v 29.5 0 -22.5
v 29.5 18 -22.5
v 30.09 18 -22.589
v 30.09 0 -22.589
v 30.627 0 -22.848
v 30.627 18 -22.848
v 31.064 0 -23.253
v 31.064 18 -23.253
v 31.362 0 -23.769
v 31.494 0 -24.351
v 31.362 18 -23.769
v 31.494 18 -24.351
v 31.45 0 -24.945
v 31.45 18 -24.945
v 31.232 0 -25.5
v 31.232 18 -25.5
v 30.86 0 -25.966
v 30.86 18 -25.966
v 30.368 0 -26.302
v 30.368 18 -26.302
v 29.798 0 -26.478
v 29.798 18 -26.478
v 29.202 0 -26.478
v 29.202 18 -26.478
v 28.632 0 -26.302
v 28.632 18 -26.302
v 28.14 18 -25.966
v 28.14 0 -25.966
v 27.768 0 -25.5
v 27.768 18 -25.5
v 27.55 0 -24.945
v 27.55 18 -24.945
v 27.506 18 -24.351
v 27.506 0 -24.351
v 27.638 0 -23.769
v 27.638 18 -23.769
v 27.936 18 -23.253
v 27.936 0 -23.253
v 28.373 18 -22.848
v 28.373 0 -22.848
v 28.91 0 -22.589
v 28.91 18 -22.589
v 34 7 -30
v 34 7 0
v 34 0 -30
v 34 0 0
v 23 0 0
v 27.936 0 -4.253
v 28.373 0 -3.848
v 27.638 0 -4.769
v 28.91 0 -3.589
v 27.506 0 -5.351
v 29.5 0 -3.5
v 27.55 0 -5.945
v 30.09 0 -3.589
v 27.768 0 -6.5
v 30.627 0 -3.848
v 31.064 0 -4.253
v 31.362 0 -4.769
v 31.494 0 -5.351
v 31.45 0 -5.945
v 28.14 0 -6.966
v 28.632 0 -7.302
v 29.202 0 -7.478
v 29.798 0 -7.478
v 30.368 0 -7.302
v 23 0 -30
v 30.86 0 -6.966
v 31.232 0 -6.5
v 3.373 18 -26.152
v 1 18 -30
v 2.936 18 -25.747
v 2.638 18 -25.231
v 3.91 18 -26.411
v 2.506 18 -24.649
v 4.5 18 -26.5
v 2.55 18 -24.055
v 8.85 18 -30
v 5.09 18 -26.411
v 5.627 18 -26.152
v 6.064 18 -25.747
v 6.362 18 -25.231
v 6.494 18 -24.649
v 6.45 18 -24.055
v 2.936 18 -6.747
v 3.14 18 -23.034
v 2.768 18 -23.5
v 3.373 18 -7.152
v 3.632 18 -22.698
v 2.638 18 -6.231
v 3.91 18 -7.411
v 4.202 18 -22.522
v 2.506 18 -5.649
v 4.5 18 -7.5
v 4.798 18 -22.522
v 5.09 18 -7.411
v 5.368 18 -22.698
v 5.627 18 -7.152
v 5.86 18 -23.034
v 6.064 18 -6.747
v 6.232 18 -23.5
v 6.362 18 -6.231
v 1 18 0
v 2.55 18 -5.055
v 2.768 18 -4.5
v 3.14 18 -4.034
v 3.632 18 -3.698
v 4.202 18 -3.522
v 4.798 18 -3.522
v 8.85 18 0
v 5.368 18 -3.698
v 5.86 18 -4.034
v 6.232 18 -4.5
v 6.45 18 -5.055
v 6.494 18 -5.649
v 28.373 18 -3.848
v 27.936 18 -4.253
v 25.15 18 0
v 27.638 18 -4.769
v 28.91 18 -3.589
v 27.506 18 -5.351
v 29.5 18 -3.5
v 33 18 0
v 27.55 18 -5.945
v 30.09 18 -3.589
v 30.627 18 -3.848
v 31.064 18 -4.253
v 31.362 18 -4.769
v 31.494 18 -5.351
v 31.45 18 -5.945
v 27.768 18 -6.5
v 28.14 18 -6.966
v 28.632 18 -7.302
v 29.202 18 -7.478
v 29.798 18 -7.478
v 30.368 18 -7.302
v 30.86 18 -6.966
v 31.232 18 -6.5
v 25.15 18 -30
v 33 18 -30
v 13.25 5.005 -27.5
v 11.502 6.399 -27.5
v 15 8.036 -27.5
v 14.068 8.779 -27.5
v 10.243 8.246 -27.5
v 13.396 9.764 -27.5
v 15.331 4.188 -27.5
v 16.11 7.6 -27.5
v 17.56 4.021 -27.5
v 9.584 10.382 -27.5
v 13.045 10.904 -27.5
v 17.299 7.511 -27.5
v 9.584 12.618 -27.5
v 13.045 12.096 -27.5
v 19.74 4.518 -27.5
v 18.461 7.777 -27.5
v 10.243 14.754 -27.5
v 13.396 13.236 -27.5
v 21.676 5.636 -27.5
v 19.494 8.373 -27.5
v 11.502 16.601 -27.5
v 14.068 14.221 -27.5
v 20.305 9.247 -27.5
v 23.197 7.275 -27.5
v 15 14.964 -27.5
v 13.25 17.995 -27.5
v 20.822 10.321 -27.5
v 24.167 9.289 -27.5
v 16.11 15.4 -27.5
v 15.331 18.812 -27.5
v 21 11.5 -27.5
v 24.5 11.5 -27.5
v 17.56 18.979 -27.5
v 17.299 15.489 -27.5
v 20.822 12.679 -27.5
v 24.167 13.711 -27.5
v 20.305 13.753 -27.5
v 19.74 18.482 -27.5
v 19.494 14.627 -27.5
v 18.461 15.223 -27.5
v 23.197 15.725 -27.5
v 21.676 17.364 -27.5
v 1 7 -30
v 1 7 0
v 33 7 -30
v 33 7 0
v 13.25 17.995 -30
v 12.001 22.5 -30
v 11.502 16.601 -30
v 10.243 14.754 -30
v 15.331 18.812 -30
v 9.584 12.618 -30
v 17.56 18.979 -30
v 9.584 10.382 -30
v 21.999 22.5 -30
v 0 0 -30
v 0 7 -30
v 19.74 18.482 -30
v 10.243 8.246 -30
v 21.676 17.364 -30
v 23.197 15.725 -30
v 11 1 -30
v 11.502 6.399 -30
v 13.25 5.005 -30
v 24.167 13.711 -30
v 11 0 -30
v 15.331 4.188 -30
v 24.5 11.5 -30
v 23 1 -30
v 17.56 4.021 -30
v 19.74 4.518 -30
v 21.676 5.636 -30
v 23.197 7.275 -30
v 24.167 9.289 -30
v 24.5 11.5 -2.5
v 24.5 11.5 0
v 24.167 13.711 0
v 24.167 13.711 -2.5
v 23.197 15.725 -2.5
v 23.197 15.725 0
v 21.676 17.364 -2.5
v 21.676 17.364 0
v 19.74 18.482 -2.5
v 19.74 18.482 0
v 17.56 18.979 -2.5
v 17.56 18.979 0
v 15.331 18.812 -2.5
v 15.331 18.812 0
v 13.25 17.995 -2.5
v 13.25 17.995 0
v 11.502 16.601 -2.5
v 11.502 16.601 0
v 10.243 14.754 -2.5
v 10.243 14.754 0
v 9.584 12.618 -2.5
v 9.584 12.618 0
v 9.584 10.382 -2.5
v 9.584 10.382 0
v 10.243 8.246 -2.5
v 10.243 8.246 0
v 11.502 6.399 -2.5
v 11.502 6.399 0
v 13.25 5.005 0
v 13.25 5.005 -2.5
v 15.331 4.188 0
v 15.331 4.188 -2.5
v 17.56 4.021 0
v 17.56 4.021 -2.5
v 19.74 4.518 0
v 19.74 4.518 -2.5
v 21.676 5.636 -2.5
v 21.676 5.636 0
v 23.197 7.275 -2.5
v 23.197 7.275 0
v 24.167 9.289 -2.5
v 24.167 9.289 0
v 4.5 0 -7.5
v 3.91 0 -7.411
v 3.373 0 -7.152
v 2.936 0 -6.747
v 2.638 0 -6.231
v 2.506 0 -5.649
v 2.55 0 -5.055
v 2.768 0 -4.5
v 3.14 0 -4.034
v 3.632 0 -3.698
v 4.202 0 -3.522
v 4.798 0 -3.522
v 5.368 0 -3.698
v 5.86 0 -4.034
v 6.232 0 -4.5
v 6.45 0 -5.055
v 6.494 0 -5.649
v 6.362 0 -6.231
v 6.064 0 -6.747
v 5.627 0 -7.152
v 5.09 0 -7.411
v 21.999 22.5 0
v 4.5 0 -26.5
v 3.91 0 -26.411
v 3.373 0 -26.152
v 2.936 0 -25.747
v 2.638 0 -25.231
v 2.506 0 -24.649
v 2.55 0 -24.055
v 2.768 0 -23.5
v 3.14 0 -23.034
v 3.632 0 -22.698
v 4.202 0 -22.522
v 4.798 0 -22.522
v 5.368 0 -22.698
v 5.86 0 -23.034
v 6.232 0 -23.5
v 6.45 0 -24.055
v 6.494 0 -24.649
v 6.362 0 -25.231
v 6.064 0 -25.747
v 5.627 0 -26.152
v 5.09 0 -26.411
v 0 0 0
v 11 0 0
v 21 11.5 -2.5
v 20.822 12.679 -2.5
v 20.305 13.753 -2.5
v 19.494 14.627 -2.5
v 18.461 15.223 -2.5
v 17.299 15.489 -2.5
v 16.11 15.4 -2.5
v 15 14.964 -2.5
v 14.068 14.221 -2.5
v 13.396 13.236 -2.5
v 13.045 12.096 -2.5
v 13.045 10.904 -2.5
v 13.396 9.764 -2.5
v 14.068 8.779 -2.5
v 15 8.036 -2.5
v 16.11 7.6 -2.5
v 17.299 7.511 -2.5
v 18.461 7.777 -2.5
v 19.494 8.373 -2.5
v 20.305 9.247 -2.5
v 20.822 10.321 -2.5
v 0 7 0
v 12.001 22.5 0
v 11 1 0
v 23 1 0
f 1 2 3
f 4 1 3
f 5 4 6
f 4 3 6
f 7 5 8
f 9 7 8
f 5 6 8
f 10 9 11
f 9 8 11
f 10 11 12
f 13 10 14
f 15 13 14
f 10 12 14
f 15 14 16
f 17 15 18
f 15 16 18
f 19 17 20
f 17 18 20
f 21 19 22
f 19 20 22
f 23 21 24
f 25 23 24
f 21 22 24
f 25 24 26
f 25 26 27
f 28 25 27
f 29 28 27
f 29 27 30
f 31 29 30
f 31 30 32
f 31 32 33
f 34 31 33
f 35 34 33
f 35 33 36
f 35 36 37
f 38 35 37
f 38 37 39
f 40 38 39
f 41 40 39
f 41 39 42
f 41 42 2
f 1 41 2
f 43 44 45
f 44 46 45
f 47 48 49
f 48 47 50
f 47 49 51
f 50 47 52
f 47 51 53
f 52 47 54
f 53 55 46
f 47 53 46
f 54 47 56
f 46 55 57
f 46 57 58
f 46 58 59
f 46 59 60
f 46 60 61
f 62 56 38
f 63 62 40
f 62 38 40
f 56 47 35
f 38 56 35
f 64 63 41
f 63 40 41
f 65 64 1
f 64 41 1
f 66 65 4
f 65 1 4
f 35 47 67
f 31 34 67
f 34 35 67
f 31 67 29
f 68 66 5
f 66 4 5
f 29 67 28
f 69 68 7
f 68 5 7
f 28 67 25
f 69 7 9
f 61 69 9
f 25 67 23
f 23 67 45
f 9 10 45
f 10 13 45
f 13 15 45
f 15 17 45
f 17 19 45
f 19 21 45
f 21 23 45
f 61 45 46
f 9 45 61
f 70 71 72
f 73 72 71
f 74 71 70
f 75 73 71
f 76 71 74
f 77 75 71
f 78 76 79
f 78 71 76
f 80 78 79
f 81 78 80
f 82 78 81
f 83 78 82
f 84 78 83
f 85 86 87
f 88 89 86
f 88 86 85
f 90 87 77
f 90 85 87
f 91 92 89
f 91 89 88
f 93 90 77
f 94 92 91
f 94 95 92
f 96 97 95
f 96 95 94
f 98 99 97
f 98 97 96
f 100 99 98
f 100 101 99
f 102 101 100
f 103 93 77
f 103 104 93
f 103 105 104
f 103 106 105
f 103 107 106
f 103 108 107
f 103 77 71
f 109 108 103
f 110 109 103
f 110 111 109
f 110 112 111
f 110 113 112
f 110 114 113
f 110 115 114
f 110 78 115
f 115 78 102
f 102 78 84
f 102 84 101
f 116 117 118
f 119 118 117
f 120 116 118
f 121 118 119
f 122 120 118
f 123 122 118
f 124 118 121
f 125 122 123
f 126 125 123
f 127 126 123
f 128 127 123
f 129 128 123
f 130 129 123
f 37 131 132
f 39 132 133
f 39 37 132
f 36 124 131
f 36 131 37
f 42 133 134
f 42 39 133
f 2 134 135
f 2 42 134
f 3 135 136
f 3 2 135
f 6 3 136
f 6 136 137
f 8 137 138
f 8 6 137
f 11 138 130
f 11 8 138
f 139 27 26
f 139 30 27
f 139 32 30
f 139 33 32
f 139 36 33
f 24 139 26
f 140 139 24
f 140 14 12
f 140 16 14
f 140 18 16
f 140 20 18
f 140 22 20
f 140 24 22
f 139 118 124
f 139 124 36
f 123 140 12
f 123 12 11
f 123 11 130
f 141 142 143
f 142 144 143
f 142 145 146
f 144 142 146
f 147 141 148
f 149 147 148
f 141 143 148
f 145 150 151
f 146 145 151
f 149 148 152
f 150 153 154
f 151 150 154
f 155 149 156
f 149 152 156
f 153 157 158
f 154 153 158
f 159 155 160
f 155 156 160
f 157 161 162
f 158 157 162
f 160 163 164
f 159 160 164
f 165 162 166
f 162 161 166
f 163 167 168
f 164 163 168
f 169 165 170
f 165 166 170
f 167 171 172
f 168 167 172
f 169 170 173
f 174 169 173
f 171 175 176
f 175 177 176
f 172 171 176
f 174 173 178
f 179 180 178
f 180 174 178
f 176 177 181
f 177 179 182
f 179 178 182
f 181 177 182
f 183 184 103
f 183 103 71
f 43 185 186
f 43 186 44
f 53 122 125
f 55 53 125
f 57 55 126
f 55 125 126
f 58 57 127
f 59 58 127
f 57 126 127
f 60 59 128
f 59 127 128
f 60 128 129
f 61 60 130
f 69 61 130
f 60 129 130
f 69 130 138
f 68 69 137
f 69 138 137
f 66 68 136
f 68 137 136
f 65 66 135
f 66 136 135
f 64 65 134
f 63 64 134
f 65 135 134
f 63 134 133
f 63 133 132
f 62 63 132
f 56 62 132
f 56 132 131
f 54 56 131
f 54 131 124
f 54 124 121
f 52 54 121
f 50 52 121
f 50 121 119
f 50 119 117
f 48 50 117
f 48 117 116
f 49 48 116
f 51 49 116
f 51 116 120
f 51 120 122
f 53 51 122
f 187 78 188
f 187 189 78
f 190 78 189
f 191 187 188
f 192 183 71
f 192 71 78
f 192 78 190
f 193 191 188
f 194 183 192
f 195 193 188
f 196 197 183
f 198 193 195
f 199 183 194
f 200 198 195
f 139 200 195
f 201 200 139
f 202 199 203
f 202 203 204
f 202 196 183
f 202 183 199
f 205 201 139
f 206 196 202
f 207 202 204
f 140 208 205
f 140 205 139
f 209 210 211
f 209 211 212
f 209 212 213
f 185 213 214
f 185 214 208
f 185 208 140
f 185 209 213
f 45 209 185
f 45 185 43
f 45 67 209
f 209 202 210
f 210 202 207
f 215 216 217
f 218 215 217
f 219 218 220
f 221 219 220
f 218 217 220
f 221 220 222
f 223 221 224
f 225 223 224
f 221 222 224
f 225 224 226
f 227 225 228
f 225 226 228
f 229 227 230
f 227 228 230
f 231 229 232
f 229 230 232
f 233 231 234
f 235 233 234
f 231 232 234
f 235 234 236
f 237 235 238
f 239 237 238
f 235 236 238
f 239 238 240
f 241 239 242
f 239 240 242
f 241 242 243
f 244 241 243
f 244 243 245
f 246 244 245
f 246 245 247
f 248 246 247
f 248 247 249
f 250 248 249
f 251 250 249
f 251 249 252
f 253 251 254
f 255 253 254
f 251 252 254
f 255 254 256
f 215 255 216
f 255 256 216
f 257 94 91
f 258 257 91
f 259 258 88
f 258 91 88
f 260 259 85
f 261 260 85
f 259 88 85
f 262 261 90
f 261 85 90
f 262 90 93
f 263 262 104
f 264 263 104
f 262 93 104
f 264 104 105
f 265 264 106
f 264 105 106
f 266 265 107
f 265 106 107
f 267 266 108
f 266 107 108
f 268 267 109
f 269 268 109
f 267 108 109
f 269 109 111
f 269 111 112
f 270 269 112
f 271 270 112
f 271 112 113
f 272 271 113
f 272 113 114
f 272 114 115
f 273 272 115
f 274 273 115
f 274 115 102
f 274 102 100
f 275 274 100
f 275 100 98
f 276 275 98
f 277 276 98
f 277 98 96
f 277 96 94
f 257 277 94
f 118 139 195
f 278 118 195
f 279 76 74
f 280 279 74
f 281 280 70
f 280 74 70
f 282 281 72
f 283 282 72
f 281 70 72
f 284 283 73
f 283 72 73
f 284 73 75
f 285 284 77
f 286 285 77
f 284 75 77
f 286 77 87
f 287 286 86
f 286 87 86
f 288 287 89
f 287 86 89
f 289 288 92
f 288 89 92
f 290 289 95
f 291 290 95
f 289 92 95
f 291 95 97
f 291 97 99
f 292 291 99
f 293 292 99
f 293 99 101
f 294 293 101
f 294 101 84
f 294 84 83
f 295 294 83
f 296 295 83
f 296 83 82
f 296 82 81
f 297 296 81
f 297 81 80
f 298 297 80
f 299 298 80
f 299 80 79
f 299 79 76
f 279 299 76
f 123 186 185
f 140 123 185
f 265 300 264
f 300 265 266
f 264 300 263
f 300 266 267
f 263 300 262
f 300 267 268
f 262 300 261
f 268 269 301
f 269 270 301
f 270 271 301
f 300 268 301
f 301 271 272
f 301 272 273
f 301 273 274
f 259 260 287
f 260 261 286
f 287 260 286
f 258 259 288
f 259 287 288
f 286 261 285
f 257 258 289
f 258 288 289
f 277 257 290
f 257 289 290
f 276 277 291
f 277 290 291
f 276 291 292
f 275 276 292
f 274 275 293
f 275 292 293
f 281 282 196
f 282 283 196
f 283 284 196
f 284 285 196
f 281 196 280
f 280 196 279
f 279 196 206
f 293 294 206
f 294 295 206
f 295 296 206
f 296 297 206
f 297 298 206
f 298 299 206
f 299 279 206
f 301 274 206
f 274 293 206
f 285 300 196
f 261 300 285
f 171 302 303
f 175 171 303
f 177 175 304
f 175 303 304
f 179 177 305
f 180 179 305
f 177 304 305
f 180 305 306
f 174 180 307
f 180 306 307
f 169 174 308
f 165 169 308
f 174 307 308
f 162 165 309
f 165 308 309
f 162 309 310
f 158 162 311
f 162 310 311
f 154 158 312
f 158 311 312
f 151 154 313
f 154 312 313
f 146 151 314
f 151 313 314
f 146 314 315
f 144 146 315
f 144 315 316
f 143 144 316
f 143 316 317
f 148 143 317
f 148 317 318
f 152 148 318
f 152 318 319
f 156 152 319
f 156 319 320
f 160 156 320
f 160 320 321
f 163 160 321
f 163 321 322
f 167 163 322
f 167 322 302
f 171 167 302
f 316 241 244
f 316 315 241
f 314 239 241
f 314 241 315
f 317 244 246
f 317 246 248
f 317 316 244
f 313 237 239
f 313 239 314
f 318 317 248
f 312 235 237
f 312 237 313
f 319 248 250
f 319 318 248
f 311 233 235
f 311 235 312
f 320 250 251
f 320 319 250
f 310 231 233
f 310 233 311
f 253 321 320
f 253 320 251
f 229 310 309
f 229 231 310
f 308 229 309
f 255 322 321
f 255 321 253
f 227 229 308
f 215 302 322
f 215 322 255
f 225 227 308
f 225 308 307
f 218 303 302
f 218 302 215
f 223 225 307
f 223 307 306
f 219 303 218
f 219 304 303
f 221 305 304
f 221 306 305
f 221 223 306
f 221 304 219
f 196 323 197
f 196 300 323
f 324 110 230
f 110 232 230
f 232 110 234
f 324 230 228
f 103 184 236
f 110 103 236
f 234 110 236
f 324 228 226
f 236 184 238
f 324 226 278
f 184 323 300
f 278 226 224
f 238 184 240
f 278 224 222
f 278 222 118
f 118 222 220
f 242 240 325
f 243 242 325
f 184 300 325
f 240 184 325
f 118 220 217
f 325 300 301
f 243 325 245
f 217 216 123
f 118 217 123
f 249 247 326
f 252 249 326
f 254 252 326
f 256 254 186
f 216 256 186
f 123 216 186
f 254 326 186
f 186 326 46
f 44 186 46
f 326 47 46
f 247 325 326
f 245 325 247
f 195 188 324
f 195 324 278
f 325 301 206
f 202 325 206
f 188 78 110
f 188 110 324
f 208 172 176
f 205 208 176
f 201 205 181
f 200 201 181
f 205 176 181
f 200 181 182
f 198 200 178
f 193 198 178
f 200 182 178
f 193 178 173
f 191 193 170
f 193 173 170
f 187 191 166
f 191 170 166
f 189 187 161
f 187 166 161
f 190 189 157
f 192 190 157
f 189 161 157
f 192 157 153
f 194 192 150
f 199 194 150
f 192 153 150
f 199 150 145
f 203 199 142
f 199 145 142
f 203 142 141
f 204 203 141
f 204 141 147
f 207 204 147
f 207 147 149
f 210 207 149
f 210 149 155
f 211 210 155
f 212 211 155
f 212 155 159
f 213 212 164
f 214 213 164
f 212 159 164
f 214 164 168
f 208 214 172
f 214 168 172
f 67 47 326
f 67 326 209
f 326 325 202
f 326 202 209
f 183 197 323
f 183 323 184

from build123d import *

# Parameters (mm, degrees)
SKETCH1_W           = 10
SKETCH1_H           = 30
SKETCH1_W_2         = 1
BOSS_EXTRUDE1_DEPTH = 1
BOSS_EXTRUDE4_START = 1
SKETCH1_3_W         = 34
SKETCH1_3_H         = 30
BOSS_EXTRUDE4_DEPTH = 6
BOSS_EXTRUDE5_START = 7
SKETCH1_4_W         = 10
SKETCH1_4_H         = 30
SKETCH1_4_W_2       = 12
BOSS_EXTRUDE5_DEPTH = 11
SKETCH3_W           = 8.5
SKETCH3_H           = 30
BOSS_EXTRUDE6_DEPTH = 4.5
CHAMFER1_SIZE       = 5
CHAMFER1_SIZE_2     = 3.501037691
SKETCH5_R           = 7.5
SKETCH5_R_2         = 4
CUT_EXTRUDE1_DEPTH  = 2.5
SKETCH5_3_R         = 4
CUT_EXTRUDE2_DEPTH  = 51.618672444
CUT_EXTRUDE4_START  = -27.5
SKETCH5_4_R         = 7.5
SKETCH5_4_R_2       = 4
CUT_EXTRUDE4_DEPTH  = 2.5
SKETCH6_R           = 2
CUT_EXTRUDE5_DEPTH  = 49.785243671


with BuildPart() as part:
    # Sketch1 → Boss-Extrude1 (new body)
    with BuildSketch(Plane(origin=(0, 0, 0), x_dir=(1, 0, 0), z_dir=(0, 1, 0))):
        with Locations((28, 15)):
            Rectangle(SKETCH1_W, SKETCH1_H)
        with Locations((33.5, 15)):
            Rectangle(SKETCH1_W_2, SKETCH1_H)
        with Locations((0.5, 15)):
            Rectangle(SKETCH1_W_2, SKETCH1_H)
        with Locations((6, 15)):
            Rectangle(SKETCH1_W, SKETCH1_H)
    extrude(amount=BOSS_EXTRUDE1_DEPTH)

    # Sketch1<3> → Boss-Extrude4 (add)
    with BuildSketch(Plane(origin=(0, 0, 0), x_dir=(1, 0, 0), z_dir=(0, 1, 0)).offset(BOSS_EXTRUDE4_START)):
        with Locations((17, 15)):
            Rectangle(SKETCH1_3_W, SKETCH1_3_H)
    extrude(amount=BOSS_EXTRUDE4_DEPTH)

    # Sketch1<4> → Boss-Extrude5 (add)
    with BuildSketch(Plane(origin=(0, 0, 0), x_dir=(1, 0, 0), z_dir=(0, 1, 0)).offset(BOSS_EXTRUDE5_START)):
        with Locations((6, 15)):
            Rectangle(SKETCH1_4_W, SKETCH1_4_H)
        with Locations((28, 15)):
            Rectangle(SKETCH1_4_W, SKETCH1_4_H)
        with Locations((17, 15)):
            Rectangle(SKETCH1_4_W_2, SKETCH1_4_H)
    extrude(amount=BOSS_EXTRUDE5_DEPTH)

    # Sketch3 → Boss-Extrude6 (add)
    with BuildSketch(Plane(origin=(0, 18, 0), x_dir=(1, 0, 0), z_dir=(0, 1, 0))):
        with Locations((21.25, 15)):
            Rectangle(SKETCH3_W, SKETCH3_H)
        with Locations((12.75, 15)):
            Rectangle(SKETCH3_W, SKETCH3_H)
    extrude(amount=BOSS_EXTRUDE6_DEPTH)

    # Chamfer1
    # the kernel refuses this chamfer: 5, 3.501037691 mm, written as the material it takes off along each edge
    with BuildSketch(Plane(origin=(25.5, 22.5, 12.912761151), x_dir=(0, -1, 0), z_dir=(0, 0, -1))) as chamfer1_piece_1_section:
        Polygon((CHAMFER1_SIZE, 0), (0, CHAMFER1_SIZE_2), (0, 0), align=None)
    chamfer1_piece_1 = extrude(amount=55.825522303, mode=Mode.PRIVATE)
    chamfer1_piece_1 = split(chamfer1_piece_1, bisect_by=Plane(origin=(25.5, 18, 12.912761151), z_dir=(0, 1, 0)), keep=Keep.TOP, mode=Mode.PRIVATE)
    add(chamfer1_piece_1, mode=Mode.SUBTRACT)
    with BuildSketch(Plane(origin=(8.5, 22.5, -42.912761151), x_dir=(0, -1, 0), z_dir=(0, 0, 1))) as chamfer1_piece_2_section:
        Polygon((CHAMFER1_SIZE, 0), (0, CHAMFER1_SIZE_2), (0, 0), align=None)
    chamfer1_piece_2 = extrude(amount=55.825522303, mode=Mode.PRIVATE)
    chamfer1_piece_2 = split(chamfer1_piece_2, bisect_by=Plane(origin=(8.5, 18, -42.912761151), z_dir=(0, 1, 0)), keep=Keep.TOP, mode=Mode.PRIVATE)
    add(chamfer1_piece_2, mode=Mode.SUBTRACT)

    # Sketch5 → Cut-Extrude1 (cut)
    # profile 1 of 2: a face of its own
    with BuildSketch(Plane.XY):
        with Locations((17, 11.5)):
            Circle(SKETCH5_R)
        with Locations((17, 11.5)):
            Circle(SKETCH5_R_2, mode=Mode.SUBTRACT)
    # profile 2 of 2: a face of its own
    with BuildSketch(Plane.XY):
        with Locations((17, 11.5)):
            Circle(SKETCH5_R_2)
    extrude(amount=-CUT_EXTRUDE1_DEPTH, mode=Mode.SUBTRACT)

    # Sketch5<3> → Cut-Extrude2 (cut, through all)
    with BuildSketch(Plane.XY):
        with Locations((17, 11.5)):
            Circle(SKETCH5_3_R)
    extrude(amount=-CUT_EXTRUDE2_DEPTH, mode=Mode.SUBTRACT)

    # Sketch5<4> → Cut-Extrude4 (cut)
    # profile 1 of 2: a face of its own
    with BuildSketch(Plane.XY.offset(CUT_EXTRUDE4_START)):
        with Locations((17, 11.5)):
            Circle(SKETCH5_4_R)
        with Locations((17, 11.5)):
            Circle(SKETCH5_4_R_2, mode=Mode.SUBTRACT)
    # profile 2 of 2: a face of its own
    with BuildSketch(Plane.XY.offset(CUT_EXTRUDE4_START)):
        with Locations((17, 11.5)):
            Circle(SKETCH5_4_R_2)
    extrude(amount=-CUT_EXTRUDE4_DEPTH, mode=Mode.SUBTRACT)

    # Sketch6 → Cut-Extrude5 (cut, through all)
    with BuildSketch(Plane(origin=(0, 18, 0), x_dir=(1, 0, 0), z_dir=(0, 1, 0))):
        with Locations(Location((29.5, 24.5, 0), (0, 0, 270))):
            Circle(SKETCH6_R)
        with Locations(Location((29.5, 5.5, 0), (0, 0, 270))):
            Circle(SKETCH6_R)
        with Locations(Location((4.5, 24.5, 0), (0, 0, 90))):
            Circle(SKETCH6_R)
        with Locations(Location((4.5, 5.5, 0), (0, 0, 90))):
            Circle(SKETCH6_R)
    extrude(amount=-CUT_EXTRUDE5_DEPTH, mode=Mode.SUBTRACT)


solid = part.part
